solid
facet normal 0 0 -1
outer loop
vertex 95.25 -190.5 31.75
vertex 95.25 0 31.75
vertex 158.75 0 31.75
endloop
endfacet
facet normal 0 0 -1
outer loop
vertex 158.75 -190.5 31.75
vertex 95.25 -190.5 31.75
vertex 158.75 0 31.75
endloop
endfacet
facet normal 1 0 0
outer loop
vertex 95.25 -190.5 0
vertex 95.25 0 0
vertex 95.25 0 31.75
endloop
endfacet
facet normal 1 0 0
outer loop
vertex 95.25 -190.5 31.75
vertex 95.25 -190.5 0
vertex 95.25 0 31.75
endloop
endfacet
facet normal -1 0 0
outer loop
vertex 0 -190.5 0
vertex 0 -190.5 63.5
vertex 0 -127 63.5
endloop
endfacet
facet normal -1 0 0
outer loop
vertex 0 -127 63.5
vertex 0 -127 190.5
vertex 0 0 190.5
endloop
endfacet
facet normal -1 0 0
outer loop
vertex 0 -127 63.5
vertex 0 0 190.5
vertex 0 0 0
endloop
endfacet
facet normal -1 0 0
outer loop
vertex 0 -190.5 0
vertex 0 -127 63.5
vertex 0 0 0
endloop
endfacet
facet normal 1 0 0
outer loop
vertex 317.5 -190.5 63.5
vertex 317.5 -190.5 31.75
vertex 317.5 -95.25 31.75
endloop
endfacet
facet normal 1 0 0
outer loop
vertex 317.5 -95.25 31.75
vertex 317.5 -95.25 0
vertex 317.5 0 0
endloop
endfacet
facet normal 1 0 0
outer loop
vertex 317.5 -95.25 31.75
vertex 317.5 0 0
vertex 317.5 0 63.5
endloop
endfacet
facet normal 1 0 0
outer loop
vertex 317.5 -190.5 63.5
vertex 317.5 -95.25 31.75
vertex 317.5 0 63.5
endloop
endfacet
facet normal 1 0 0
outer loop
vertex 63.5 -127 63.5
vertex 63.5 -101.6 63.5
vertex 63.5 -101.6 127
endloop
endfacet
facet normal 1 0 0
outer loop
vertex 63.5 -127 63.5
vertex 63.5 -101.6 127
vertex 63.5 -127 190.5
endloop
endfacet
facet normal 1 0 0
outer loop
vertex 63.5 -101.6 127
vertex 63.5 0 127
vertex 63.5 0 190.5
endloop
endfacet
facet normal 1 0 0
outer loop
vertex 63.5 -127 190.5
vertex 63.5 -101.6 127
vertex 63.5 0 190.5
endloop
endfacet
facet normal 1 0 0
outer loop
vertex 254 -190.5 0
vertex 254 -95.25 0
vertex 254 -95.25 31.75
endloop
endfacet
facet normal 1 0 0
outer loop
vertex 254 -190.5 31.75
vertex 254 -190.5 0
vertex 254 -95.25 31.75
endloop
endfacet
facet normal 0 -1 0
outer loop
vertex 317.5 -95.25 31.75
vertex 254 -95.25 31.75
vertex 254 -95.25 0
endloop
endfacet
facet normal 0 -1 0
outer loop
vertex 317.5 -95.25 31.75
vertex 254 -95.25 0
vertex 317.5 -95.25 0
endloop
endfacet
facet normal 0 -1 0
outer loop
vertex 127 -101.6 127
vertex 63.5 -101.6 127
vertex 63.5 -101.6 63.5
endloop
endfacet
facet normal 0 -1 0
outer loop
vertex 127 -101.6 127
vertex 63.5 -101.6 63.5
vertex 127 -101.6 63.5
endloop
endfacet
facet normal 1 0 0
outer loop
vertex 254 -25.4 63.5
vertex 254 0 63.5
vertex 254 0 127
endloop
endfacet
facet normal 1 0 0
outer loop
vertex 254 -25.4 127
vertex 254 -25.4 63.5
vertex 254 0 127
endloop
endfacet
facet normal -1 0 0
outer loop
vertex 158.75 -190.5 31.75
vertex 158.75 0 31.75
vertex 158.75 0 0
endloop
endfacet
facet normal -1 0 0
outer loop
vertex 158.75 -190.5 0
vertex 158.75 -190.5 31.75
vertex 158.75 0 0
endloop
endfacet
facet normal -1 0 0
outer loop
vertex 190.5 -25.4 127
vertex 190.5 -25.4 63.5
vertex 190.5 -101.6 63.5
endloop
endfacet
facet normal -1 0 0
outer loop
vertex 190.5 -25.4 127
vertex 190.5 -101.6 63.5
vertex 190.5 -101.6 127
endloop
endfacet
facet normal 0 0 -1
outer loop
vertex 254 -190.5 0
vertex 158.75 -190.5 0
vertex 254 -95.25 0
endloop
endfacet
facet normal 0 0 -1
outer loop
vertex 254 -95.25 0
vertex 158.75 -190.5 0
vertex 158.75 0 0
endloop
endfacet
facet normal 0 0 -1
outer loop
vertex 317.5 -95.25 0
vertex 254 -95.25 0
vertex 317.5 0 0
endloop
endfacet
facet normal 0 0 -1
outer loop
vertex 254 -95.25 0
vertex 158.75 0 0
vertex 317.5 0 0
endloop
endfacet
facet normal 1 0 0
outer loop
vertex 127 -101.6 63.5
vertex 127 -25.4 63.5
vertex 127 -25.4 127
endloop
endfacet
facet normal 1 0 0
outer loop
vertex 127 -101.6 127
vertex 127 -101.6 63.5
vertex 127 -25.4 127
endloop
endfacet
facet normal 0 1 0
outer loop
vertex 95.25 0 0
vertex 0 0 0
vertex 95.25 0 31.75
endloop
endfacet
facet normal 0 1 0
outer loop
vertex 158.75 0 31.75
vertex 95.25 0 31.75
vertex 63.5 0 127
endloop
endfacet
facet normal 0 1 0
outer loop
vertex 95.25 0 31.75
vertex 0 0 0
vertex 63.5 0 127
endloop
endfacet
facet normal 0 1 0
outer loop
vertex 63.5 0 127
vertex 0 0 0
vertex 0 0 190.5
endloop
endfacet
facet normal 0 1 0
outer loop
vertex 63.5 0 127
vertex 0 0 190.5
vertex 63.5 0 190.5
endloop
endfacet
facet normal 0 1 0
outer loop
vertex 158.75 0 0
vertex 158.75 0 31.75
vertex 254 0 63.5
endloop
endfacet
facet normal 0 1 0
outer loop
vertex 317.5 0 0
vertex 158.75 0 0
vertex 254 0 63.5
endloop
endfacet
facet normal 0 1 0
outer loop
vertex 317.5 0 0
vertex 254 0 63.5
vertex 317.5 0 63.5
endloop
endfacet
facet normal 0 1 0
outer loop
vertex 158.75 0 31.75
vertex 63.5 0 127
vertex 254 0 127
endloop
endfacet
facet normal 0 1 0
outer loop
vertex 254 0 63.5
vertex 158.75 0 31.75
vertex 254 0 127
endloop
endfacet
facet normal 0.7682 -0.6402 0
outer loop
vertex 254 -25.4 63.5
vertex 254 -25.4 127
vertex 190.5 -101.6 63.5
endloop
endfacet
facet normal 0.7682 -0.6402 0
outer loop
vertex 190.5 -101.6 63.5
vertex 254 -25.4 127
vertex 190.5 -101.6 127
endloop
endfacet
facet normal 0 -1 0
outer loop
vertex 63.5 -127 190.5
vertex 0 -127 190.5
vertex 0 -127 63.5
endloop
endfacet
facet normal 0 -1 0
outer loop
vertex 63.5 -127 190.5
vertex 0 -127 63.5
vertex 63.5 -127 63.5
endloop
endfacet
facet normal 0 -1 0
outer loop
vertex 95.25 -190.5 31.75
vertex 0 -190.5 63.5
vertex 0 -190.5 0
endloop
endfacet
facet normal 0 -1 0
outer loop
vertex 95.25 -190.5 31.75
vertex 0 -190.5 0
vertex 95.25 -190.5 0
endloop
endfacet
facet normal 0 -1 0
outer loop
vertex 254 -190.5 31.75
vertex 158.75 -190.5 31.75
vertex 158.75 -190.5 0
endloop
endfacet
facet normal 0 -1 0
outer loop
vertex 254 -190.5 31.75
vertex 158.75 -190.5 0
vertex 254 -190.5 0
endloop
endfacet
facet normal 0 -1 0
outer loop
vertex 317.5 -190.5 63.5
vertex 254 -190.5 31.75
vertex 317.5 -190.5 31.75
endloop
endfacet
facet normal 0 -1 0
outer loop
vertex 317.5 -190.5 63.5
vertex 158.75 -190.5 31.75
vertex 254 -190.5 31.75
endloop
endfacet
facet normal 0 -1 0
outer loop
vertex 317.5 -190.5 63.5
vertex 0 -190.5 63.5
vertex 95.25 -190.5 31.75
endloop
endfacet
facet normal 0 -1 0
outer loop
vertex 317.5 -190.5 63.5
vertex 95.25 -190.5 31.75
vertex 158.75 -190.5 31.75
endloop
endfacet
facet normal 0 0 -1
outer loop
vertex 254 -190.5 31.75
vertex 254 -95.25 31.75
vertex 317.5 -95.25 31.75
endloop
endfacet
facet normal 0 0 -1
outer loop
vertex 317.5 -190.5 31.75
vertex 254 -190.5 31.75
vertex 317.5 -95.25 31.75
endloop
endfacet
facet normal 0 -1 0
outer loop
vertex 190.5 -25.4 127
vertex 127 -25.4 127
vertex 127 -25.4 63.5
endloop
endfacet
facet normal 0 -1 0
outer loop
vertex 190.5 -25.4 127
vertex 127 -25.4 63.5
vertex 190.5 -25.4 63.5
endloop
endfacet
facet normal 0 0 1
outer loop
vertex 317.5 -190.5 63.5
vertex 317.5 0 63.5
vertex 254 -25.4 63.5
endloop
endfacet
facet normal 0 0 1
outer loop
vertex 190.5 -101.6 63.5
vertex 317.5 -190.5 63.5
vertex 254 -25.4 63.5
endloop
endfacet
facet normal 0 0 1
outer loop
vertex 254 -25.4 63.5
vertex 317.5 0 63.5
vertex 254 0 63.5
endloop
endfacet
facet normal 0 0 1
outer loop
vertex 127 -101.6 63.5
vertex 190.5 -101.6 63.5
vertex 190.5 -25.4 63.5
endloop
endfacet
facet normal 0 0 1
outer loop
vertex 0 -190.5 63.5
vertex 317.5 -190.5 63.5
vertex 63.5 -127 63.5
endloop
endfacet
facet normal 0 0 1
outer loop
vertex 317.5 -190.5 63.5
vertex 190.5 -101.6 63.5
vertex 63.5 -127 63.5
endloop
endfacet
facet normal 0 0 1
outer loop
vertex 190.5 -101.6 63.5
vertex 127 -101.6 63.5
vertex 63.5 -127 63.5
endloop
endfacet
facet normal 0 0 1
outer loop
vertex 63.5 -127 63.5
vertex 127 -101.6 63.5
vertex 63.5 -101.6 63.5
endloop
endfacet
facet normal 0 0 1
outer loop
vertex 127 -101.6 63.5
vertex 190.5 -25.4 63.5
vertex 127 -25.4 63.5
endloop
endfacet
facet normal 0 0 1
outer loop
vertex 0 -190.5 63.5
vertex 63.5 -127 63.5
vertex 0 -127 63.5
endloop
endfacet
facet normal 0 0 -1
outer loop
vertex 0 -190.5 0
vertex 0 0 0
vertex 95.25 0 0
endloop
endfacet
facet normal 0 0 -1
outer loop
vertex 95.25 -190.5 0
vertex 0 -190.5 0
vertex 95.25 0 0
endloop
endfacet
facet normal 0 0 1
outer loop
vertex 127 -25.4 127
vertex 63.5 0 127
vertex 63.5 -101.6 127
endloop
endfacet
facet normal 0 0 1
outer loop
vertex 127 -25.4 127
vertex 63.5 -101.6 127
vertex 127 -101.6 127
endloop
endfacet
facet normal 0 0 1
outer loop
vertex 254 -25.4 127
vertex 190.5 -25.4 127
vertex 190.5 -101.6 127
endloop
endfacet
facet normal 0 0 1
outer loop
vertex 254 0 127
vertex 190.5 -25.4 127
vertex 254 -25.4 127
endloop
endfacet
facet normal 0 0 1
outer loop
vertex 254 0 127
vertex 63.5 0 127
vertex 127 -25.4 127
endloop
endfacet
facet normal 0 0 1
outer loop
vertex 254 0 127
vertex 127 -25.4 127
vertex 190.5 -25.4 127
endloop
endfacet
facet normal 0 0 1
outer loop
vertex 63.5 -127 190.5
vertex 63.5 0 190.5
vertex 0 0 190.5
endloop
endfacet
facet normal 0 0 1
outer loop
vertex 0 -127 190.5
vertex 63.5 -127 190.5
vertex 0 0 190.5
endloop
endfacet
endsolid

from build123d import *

# Parameters (mm, degrees)
F1_DEPTH = 190.5
F2_DEPTH = 127
F0_W     = 63.5
F0_H     = 63.5
F3_DEPTH = 101.6
F4_DEPTH = 25.4
F6_DEPTH = 63.5
F0_H_2   = 31.75
F7_DEPTH = 95.25


with BuildPart() as f1:
    # F0 (on Front) → F1 (new body)
    with BuildSketch(Plane.XZ):
        Polygon((0, 63.5), (0, 0), (95.25, 0), (95.25, 31.75), (158.75, 31.75), (158.75, 0), (254, 0), (254, 31.75), (317.5, 31.75), (317.5, 63.5), (254, 63.5), (190.5, 63.5), (127, 63.5), (63.5, 63.5), align=None)
    extrude(amount=F1_DEPTH)

    # F0 (on Front) → F2 (join)
    with BuildSketch(Plane.XZ):
        Polygon((0, 190.5), (0, 63.5), (63.5, 63.5), (63.5, 127), (63.5, 190.5), align=None)
    extrude(amount=F2_DEPTH)

    # F0 (on Front) → F3 (join)
    with BuildSketch(Plane.XZ):
        with Locations((95.25, 95.25)):
            Rectangle(F0_W, F0_H)
        with Locations((222.25, 95.25)):
            Rectangle(F0_W, F0_H)
    extrude(amount=F3_DEPTH)

    # F0 (on Front) → F4 (join)
    with BuildSketch(Plane.XZ):
        with Locations((158.75, 95.25)):
            Rectangle(F0_W, F0_H)
    extrude(amount=F4_DEPTH)

    # F5 (on face) → F6 (cut)
    with BuildSketch(Plane.XY.offset(127)):
        Polygon((254, -25.4), (190.5, -101.6), (254, -101.6), align=None)
    extrude(amount=-F6_DEPTH, mode=Mode.SUBTRACT)

    # F0 (on Front) → F7 (join)
    with BuildSketch(Plane.XZ):
        with Locations((285.75, 15.875)):
            Rectangle(F0_W, F0_H_2)
    extrude(amount=F7_DEPTH)


solid = f1.part
